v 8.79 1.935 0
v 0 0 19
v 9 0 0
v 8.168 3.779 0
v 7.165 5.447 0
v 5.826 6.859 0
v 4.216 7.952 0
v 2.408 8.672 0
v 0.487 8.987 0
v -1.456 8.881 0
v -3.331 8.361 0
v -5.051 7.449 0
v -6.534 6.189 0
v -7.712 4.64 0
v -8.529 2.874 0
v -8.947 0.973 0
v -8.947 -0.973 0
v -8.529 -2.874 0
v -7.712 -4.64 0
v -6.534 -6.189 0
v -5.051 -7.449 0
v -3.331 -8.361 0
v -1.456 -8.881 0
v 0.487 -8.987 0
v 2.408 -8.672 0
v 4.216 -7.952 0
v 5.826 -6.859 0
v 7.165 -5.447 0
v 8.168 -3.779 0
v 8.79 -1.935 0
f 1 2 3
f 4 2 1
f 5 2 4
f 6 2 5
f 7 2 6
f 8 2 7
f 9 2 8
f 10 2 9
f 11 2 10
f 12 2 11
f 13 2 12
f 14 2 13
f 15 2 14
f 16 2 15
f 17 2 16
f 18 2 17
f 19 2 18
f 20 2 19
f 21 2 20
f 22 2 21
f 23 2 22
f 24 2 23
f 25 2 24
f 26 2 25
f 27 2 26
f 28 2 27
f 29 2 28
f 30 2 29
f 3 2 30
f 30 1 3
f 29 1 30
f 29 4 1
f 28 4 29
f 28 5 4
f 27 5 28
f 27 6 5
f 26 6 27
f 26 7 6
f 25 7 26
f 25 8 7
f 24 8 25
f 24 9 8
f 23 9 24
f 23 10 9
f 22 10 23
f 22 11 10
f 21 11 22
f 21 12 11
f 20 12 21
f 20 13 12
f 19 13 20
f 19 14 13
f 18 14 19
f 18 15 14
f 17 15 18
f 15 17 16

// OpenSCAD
// Generated by SolidPython 1.0.1 on 2020-07-29 00:46:43


cylinder(h = 19, r1 = 9, r2 = 0);
/***********************************************
*********      SolidPython code:      **********
************************************************
 
# import packages: SolidPython
from solid import *
from solid.utils import *
from itertools import chain, combinations, permutations


class Resize:

    def __init__(self, scad_file):
        self.scad_file = scad_file
        #self.scad_file = import_scad(scad_file)
        # cone/cylinder param:
        self.r1 = 0
        self.r2 = 0
        self.h = 0
        # rectangular prism param:
        self.w = 0
        self.l = 0
        # ellipse param:
        self.r = 0

    # import OpenScad code (file name corresponds to shape)


    # classify shape + parameters
    def assign(self, param1, param2, param3):
        if self.scad_file == 'cone.scad':
            self.r1 = param1
            self.r2 = param2
            self.h = param3
        elif self.scad_file == 'cylinder.scad':
            self.r1 = param1
            self.r2 = param2
            self.h = param3
        elif self.scad_file == 'rectangularPrism.scad':
            self.h = param1
            self.l = param2
            self.w = param3
        else:
            self.r = param1
            self.h = param2

    # resize parameters
    def iterate(self):
        x = range(3, 20, 2)
        i = 1
        if self.scad_file == 'cone.scad':
            tempList = list(permutations(x, 2))
            for temp in tempList:
                param1 = temp[0]
                param2 = temp[1]
                filepath = 'produced_scad_files/' + 'cone' + str(param1) + '_' + str(param2) + '_' + '.scad'
                scad_render_to_file(cylinder(h=param1, r1=param2, r2=0), filepath)

        elif self.scad_file == 'cylinder.scad':
            tempList = list(permutations(x, 3))
            for temp in tempList:
                param1 = temp[0]
                param2 = temp[1]
                filepath = 'produced_scad_files/' + 'cylinder' + str(param1) + '_' + str(param2) + '_' + '.scad'
                scad_render_to_file(cylinder(h=param1, r1=param2, r2=param2), filepath)

        elif self.scad_file == 'rectangularPrism.scad':
            tempList = list(permutations(x, 3))
            for temp in tempList:
                param1 = temp[0]
                param2 = temp[1]
                param3 = temp[2]
                filepath = 'produced_scad_files/' + 'rectangularPrism' + str(param1) + '_' + str(param2) + '_' + str(
                    param3) + '.scad'
                scad_render_to_file(cube(size=(param1, param2, param3)), filepath)

        elif self.scad_file == 'ellipse.scad':
            tempList = list(permutations(x, 4))
            for temp in tempList:
                param1 = temp[0]
                param2 = temp[1]
                param3 = temp[2]
                param4 = temp[3]
                filepath = 'produced_scad_files/' + 'ellipse' + str(param1) + '_' + str(param2) + '_' + str(param3) + '_' + str(param4) + '.scad'
                scad_render_to_file(scale([param1, param2, param3])(sphere(r=param4)), filepath)

    def render_to_scadfile(self):
        scad_render_to_file(scad, 'example.scad') 
 
************************************************/
